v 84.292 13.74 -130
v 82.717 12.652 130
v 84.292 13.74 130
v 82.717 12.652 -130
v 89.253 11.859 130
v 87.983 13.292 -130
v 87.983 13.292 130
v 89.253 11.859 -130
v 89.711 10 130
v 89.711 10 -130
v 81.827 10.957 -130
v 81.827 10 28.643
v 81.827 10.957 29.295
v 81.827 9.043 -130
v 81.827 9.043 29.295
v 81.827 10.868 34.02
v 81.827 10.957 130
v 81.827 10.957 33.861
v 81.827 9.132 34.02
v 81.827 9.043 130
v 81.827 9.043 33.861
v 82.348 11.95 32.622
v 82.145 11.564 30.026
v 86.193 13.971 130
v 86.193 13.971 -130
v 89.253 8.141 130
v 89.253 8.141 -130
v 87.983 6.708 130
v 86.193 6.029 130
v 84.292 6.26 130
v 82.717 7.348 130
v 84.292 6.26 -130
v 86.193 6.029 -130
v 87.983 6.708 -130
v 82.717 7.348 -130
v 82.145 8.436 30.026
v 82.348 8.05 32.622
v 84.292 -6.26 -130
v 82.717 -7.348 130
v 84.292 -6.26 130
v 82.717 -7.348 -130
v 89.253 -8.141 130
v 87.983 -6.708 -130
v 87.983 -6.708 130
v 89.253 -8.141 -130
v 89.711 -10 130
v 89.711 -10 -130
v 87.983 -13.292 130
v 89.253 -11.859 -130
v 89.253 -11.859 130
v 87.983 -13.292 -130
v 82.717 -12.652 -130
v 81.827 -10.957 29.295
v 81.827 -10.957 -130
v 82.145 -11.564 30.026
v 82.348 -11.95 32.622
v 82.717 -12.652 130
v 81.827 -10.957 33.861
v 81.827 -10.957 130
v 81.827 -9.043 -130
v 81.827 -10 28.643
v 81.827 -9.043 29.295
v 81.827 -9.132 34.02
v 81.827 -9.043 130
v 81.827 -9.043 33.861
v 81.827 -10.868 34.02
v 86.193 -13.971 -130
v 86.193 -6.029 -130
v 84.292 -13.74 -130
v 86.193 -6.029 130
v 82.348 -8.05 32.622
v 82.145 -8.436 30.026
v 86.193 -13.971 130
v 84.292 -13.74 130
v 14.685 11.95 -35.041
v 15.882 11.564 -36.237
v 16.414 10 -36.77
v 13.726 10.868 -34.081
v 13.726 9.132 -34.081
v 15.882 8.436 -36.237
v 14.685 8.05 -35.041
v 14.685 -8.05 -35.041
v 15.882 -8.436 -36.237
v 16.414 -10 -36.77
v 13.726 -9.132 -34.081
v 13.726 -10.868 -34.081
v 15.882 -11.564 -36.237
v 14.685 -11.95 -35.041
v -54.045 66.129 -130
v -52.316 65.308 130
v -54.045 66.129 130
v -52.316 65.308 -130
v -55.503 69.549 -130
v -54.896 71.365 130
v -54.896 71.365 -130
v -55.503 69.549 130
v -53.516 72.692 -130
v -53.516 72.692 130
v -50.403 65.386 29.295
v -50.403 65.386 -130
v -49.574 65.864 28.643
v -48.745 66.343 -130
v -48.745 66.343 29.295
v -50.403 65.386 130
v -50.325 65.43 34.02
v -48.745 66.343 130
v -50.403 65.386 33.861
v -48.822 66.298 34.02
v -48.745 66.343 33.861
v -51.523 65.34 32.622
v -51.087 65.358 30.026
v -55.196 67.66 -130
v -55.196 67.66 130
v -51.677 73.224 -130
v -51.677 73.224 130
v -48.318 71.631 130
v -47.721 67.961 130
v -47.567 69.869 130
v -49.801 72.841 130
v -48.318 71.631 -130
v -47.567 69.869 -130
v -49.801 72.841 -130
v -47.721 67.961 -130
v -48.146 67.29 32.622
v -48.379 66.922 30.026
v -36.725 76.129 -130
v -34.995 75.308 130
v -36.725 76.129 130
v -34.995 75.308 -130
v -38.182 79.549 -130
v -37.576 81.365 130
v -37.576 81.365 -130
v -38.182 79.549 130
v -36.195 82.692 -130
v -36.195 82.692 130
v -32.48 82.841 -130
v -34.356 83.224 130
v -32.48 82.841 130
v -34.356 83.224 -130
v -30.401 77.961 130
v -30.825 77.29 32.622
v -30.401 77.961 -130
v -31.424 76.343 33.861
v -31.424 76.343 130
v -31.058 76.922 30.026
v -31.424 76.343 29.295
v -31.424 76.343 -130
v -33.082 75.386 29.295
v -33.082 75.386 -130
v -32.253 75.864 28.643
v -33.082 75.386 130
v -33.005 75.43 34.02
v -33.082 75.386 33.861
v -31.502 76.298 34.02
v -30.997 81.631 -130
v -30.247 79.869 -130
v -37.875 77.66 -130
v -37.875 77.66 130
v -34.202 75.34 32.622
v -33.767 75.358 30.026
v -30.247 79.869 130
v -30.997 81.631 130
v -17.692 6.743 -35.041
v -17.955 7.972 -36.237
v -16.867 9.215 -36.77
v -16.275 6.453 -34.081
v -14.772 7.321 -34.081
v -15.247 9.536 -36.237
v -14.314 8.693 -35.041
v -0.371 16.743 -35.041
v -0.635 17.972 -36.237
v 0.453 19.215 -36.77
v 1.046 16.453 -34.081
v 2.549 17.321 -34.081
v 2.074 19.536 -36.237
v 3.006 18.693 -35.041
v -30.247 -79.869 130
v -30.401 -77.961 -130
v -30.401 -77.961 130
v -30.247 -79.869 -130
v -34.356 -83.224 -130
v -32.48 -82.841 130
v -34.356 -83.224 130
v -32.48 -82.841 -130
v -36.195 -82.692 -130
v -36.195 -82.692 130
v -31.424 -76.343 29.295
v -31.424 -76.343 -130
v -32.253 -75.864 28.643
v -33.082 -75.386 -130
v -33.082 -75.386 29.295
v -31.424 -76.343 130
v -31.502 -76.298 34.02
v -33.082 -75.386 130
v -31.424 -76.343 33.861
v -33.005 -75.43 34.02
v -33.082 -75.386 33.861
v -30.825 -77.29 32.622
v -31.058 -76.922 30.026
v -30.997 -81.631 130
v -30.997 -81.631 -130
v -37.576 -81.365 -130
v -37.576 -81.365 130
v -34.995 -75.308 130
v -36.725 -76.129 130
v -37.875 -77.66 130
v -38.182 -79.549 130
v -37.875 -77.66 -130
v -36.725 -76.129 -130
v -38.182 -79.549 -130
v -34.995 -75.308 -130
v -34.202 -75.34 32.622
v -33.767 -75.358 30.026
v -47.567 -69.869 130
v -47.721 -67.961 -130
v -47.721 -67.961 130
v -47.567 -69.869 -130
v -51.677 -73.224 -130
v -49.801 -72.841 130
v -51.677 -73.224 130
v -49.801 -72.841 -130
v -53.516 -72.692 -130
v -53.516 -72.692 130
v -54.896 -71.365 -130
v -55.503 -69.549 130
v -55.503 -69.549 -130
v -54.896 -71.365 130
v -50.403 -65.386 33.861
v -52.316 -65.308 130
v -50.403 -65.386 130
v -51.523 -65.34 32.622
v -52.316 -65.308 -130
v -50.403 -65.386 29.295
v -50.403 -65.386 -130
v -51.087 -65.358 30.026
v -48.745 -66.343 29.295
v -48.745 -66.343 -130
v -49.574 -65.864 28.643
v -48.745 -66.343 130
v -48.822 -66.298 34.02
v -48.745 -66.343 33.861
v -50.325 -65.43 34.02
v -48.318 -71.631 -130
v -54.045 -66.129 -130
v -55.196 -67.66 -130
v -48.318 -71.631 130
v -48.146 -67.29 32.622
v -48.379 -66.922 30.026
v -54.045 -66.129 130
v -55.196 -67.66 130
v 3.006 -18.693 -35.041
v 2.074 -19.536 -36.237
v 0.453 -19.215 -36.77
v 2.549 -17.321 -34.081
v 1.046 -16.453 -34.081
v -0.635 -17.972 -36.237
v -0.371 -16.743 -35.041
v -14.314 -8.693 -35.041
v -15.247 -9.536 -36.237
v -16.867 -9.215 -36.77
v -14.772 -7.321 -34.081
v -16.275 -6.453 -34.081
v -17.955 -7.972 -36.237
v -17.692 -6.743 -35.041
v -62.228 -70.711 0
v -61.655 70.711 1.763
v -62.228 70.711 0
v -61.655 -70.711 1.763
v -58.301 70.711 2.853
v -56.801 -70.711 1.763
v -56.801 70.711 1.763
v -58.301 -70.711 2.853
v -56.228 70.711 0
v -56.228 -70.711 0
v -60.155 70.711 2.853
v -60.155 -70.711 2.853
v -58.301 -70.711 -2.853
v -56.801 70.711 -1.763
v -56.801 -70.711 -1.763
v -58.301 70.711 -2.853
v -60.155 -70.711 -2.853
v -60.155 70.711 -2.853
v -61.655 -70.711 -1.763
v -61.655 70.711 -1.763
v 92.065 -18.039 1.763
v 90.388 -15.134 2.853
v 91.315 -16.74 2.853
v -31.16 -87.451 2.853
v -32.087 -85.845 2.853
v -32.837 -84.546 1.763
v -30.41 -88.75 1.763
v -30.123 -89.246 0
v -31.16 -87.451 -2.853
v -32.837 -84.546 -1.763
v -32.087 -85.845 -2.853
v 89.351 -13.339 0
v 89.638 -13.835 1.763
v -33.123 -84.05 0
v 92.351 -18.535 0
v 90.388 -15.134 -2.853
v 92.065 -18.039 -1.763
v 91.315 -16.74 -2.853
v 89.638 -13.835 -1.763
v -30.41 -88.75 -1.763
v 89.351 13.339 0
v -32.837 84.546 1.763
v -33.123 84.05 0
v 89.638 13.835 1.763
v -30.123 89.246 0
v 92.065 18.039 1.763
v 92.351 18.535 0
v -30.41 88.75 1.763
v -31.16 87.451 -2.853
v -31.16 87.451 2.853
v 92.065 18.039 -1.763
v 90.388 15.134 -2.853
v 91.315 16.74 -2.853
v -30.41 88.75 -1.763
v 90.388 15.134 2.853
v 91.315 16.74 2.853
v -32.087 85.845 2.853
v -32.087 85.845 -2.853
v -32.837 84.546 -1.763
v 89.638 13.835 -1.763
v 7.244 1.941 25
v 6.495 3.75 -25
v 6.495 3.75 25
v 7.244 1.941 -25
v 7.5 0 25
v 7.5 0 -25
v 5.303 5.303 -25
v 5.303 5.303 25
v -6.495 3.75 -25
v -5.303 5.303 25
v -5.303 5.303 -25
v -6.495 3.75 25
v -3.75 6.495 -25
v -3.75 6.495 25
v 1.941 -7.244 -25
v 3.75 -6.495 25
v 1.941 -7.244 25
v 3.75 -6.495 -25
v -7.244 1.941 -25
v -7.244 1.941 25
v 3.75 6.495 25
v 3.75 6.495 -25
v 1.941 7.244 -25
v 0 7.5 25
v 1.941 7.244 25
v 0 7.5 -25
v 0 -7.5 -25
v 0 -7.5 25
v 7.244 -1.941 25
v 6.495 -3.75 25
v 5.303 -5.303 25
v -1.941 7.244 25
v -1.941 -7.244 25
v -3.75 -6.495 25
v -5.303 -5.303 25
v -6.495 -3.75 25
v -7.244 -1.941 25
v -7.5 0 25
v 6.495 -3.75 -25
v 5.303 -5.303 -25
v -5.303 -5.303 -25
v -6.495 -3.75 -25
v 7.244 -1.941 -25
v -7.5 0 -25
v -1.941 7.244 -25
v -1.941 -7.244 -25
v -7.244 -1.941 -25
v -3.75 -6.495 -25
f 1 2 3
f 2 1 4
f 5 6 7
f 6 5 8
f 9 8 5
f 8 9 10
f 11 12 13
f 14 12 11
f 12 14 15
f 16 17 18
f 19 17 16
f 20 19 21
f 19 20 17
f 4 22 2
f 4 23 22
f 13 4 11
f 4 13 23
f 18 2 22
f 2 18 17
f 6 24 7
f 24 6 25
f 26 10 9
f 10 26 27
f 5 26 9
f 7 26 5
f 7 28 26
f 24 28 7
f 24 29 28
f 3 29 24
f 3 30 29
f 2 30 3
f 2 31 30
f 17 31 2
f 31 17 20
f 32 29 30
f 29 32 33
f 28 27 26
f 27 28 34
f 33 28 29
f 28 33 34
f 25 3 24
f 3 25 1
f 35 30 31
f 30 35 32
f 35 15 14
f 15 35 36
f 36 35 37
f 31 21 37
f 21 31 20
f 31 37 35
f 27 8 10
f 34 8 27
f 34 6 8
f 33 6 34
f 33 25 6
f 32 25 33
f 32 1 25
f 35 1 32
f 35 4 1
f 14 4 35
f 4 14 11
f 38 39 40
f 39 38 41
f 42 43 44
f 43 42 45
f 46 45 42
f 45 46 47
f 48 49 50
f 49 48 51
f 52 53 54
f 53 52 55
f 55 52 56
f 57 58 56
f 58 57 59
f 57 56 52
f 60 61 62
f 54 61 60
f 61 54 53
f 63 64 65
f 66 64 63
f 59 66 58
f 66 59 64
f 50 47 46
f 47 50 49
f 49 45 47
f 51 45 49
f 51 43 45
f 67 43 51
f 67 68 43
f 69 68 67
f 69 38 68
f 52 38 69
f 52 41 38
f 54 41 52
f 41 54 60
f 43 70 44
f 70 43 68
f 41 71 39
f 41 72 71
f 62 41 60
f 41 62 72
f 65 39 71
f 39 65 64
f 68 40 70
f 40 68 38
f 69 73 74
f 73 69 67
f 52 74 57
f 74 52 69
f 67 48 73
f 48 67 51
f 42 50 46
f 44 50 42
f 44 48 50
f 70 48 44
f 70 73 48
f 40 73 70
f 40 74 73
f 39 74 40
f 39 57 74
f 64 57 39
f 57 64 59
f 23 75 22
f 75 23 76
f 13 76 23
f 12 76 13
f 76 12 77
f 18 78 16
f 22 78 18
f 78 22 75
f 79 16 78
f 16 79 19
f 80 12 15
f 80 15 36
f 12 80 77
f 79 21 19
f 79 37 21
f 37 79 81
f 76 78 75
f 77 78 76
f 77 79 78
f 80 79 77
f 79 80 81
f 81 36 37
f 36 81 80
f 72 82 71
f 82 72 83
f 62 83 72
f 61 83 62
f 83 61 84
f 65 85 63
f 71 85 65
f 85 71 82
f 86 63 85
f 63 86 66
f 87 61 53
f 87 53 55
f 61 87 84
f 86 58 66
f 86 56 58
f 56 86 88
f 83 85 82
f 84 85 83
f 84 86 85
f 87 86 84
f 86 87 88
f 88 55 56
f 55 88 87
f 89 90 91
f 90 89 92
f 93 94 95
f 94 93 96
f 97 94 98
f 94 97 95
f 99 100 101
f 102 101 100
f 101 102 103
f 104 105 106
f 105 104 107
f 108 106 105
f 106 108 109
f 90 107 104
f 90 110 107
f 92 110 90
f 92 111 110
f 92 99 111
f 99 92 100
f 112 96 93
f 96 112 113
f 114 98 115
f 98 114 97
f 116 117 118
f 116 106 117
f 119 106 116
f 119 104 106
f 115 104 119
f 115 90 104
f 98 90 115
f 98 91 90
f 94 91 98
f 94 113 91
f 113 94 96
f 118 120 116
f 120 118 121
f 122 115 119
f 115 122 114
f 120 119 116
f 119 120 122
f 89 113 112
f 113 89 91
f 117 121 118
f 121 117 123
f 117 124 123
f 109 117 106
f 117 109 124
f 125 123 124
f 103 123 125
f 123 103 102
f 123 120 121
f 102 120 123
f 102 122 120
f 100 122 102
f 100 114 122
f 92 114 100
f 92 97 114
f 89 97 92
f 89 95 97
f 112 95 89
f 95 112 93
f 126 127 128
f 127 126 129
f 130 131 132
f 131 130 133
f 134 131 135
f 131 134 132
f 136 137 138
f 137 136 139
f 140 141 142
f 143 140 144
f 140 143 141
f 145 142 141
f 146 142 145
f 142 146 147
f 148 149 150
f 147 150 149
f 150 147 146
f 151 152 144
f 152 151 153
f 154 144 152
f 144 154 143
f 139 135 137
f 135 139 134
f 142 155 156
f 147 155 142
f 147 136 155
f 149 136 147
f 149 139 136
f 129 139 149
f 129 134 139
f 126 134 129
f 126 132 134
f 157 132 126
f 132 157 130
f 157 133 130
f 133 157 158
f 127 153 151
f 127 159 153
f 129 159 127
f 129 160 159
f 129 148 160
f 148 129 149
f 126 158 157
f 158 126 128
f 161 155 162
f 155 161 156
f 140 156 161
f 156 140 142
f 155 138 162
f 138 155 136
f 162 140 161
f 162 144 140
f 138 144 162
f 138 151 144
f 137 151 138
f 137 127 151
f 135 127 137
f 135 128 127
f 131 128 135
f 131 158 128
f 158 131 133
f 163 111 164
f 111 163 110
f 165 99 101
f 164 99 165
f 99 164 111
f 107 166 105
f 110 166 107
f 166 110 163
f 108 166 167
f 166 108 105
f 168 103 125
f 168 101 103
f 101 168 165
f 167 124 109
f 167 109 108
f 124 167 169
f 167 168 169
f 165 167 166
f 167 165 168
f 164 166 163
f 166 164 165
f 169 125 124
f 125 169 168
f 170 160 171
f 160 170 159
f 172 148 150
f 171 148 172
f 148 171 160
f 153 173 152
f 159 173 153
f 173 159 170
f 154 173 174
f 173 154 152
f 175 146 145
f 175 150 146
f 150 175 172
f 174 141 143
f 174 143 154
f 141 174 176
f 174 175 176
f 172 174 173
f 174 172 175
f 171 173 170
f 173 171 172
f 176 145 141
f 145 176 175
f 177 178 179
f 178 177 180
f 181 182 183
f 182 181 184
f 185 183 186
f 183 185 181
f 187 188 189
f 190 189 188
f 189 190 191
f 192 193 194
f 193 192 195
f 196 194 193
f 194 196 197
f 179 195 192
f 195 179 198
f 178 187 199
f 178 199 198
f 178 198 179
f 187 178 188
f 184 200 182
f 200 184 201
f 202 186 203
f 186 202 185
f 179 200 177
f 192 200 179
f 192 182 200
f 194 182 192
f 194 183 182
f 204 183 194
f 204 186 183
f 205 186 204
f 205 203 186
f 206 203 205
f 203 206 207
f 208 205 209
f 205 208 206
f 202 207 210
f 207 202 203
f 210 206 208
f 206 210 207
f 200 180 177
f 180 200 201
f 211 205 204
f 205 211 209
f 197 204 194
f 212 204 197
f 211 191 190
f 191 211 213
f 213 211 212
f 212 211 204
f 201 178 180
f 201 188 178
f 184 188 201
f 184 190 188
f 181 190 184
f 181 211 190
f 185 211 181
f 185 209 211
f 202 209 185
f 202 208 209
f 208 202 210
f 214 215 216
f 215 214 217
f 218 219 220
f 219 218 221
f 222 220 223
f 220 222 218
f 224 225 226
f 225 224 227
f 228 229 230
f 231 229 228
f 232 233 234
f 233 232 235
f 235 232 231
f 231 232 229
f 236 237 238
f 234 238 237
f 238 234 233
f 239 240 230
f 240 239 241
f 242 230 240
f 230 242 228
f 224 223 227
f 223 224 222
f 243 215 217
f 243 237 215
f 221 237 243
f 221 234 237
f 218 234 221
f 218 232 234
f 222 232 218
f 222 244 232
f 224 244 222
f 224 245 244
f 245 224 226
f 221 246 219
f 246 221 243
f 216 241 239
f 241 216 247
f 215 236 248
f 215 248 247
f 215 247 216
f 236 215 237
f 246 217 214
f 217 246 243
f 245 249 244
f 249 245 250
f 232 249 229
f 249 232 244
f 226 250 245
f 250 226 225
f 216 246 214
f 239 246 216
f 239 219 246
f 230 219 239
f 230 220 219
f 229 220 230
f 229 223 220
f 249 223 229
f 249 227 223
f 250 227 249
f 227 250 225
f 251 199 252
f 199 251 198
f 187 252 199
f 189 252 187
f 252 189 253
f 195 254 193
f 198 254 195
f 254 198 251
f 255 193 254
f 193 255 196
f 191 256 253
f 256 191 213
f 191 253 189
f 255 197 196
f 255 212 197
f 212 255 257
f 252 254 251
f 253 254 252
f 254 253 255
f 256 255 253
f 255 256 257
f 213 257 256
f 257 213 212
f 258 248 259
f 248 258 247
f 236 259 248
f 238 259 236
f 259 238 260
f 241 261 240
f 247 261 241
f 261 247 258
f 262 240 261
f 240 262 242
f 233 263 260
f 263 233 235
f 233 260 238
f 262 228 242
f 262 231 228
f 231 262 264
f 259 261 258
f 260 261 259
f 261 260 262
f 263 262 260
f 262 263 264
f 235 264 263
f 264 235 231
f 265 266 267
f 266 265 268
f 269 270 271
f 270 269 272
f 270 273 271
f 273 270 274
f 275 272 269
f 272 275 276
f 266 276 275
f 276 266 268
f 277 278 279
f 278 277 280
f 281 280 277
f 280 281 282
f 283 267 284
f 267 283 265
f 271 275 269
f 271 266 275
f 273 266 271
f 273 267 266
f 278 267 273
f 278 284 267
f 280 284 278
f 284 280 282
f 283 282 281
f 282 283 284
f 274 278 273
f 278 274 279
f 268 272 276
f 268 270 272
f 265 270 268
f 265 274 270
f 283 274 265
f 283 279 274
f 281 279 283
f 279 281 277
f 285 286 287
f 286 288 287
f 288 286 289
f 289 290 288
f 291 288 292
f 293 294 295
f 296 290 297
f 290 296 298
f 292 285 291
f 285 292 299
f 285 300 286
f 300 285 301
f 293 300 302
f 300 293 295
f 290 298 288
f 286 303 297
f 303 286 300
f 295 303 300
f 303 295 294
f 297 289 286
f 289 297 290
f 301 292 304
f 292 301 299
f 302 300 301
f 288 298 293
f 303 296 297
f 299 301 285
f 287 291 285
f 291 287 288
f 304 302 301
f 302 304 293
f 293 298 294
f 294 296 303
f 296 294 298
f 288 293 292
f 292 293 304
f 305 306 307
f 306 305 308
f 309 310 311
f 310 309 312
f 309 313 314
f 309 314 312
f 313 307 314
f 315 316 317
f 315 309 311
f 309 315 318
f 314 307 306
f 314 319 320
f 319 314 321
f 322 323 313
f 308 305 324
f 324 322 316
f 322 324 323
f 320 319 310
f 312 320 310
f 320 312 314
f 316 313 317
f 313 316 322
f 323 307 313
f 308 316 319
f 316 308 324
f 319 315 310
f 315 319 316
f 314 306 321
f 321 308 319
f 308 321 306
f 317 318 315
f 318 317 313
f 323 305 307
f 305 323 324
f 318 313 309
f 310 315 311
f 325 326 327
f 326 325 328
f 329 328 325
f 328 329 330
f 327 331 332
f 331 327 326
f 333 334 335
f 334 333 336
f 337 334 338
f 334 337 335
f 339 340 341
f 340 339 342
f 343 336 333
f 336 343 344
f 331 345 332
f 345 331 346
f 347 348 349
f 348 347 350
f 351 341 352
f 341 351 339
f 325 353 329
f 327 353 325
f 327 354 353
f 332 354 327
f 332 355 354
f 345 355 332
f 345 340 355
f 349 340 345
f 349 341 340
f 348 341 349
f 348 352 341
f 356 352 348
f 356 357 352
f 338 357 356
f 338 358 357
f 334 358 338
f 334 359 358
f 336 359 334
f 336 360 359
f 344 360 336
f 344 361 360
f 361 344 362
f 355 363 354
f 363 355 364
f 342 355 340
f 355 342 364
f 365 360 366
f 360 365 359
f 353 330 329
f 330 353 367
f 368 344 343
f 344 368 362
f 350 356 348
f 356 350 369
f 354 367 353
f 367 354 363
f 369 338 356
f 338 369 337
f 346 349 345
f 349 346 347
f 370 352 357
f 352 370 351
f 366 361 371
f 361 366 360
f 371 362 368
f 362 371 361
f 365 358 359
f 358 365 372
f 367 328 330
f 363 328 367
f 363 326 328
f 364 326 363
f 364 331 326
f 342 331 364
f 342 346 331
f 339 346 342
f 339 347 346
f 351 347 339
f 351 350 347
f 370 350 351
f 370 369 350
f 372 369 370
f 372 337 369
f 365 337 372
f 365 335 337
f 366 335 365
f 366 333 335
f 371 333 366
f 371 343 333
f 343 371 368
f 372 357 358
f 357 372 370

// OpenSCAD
pd = 100*sqrt(2)/2+15; //distance of poles from center
angle = 45 ; //angle of arms at rest
armlength = 100 ; //length of the arms
sep = 10 ; //seperation of poles


for(i=[0:120:360]){
	rotate([0,0,i]) translate([pd,0,0]) union(){
		translate([0,sep,0]) cylinder(h=260, r=4, center=true);
		translate([0,-sep,0]) cylinder(h=260, r=4, center=true);
	}
	rotate([0,0,i]) translate([pd-100*sin(angle)/2,0,0]) union(){
		translate([0,sep,0]) rotate([0,angle,0]) cylinder(h=armlength,r=2,center=true);
		translate([0,-sep,0]) rotate([0,angle,0]) cylinder(h=armlength,r=2,center=true);
	}

	rotate([0,0,i]) translate([-pd*sqrt(3)/2+15,0,0]) rotate([90,0,0]) cylinder(h=100*2/sqrt(2),r=3,center=true);

}


cylinder(h=50, r=15/2, center=true);

translate([0,0,-100]){
%cube([100,100,100],center=true);
%cylinder(r=50,h=100,center=true);
}
